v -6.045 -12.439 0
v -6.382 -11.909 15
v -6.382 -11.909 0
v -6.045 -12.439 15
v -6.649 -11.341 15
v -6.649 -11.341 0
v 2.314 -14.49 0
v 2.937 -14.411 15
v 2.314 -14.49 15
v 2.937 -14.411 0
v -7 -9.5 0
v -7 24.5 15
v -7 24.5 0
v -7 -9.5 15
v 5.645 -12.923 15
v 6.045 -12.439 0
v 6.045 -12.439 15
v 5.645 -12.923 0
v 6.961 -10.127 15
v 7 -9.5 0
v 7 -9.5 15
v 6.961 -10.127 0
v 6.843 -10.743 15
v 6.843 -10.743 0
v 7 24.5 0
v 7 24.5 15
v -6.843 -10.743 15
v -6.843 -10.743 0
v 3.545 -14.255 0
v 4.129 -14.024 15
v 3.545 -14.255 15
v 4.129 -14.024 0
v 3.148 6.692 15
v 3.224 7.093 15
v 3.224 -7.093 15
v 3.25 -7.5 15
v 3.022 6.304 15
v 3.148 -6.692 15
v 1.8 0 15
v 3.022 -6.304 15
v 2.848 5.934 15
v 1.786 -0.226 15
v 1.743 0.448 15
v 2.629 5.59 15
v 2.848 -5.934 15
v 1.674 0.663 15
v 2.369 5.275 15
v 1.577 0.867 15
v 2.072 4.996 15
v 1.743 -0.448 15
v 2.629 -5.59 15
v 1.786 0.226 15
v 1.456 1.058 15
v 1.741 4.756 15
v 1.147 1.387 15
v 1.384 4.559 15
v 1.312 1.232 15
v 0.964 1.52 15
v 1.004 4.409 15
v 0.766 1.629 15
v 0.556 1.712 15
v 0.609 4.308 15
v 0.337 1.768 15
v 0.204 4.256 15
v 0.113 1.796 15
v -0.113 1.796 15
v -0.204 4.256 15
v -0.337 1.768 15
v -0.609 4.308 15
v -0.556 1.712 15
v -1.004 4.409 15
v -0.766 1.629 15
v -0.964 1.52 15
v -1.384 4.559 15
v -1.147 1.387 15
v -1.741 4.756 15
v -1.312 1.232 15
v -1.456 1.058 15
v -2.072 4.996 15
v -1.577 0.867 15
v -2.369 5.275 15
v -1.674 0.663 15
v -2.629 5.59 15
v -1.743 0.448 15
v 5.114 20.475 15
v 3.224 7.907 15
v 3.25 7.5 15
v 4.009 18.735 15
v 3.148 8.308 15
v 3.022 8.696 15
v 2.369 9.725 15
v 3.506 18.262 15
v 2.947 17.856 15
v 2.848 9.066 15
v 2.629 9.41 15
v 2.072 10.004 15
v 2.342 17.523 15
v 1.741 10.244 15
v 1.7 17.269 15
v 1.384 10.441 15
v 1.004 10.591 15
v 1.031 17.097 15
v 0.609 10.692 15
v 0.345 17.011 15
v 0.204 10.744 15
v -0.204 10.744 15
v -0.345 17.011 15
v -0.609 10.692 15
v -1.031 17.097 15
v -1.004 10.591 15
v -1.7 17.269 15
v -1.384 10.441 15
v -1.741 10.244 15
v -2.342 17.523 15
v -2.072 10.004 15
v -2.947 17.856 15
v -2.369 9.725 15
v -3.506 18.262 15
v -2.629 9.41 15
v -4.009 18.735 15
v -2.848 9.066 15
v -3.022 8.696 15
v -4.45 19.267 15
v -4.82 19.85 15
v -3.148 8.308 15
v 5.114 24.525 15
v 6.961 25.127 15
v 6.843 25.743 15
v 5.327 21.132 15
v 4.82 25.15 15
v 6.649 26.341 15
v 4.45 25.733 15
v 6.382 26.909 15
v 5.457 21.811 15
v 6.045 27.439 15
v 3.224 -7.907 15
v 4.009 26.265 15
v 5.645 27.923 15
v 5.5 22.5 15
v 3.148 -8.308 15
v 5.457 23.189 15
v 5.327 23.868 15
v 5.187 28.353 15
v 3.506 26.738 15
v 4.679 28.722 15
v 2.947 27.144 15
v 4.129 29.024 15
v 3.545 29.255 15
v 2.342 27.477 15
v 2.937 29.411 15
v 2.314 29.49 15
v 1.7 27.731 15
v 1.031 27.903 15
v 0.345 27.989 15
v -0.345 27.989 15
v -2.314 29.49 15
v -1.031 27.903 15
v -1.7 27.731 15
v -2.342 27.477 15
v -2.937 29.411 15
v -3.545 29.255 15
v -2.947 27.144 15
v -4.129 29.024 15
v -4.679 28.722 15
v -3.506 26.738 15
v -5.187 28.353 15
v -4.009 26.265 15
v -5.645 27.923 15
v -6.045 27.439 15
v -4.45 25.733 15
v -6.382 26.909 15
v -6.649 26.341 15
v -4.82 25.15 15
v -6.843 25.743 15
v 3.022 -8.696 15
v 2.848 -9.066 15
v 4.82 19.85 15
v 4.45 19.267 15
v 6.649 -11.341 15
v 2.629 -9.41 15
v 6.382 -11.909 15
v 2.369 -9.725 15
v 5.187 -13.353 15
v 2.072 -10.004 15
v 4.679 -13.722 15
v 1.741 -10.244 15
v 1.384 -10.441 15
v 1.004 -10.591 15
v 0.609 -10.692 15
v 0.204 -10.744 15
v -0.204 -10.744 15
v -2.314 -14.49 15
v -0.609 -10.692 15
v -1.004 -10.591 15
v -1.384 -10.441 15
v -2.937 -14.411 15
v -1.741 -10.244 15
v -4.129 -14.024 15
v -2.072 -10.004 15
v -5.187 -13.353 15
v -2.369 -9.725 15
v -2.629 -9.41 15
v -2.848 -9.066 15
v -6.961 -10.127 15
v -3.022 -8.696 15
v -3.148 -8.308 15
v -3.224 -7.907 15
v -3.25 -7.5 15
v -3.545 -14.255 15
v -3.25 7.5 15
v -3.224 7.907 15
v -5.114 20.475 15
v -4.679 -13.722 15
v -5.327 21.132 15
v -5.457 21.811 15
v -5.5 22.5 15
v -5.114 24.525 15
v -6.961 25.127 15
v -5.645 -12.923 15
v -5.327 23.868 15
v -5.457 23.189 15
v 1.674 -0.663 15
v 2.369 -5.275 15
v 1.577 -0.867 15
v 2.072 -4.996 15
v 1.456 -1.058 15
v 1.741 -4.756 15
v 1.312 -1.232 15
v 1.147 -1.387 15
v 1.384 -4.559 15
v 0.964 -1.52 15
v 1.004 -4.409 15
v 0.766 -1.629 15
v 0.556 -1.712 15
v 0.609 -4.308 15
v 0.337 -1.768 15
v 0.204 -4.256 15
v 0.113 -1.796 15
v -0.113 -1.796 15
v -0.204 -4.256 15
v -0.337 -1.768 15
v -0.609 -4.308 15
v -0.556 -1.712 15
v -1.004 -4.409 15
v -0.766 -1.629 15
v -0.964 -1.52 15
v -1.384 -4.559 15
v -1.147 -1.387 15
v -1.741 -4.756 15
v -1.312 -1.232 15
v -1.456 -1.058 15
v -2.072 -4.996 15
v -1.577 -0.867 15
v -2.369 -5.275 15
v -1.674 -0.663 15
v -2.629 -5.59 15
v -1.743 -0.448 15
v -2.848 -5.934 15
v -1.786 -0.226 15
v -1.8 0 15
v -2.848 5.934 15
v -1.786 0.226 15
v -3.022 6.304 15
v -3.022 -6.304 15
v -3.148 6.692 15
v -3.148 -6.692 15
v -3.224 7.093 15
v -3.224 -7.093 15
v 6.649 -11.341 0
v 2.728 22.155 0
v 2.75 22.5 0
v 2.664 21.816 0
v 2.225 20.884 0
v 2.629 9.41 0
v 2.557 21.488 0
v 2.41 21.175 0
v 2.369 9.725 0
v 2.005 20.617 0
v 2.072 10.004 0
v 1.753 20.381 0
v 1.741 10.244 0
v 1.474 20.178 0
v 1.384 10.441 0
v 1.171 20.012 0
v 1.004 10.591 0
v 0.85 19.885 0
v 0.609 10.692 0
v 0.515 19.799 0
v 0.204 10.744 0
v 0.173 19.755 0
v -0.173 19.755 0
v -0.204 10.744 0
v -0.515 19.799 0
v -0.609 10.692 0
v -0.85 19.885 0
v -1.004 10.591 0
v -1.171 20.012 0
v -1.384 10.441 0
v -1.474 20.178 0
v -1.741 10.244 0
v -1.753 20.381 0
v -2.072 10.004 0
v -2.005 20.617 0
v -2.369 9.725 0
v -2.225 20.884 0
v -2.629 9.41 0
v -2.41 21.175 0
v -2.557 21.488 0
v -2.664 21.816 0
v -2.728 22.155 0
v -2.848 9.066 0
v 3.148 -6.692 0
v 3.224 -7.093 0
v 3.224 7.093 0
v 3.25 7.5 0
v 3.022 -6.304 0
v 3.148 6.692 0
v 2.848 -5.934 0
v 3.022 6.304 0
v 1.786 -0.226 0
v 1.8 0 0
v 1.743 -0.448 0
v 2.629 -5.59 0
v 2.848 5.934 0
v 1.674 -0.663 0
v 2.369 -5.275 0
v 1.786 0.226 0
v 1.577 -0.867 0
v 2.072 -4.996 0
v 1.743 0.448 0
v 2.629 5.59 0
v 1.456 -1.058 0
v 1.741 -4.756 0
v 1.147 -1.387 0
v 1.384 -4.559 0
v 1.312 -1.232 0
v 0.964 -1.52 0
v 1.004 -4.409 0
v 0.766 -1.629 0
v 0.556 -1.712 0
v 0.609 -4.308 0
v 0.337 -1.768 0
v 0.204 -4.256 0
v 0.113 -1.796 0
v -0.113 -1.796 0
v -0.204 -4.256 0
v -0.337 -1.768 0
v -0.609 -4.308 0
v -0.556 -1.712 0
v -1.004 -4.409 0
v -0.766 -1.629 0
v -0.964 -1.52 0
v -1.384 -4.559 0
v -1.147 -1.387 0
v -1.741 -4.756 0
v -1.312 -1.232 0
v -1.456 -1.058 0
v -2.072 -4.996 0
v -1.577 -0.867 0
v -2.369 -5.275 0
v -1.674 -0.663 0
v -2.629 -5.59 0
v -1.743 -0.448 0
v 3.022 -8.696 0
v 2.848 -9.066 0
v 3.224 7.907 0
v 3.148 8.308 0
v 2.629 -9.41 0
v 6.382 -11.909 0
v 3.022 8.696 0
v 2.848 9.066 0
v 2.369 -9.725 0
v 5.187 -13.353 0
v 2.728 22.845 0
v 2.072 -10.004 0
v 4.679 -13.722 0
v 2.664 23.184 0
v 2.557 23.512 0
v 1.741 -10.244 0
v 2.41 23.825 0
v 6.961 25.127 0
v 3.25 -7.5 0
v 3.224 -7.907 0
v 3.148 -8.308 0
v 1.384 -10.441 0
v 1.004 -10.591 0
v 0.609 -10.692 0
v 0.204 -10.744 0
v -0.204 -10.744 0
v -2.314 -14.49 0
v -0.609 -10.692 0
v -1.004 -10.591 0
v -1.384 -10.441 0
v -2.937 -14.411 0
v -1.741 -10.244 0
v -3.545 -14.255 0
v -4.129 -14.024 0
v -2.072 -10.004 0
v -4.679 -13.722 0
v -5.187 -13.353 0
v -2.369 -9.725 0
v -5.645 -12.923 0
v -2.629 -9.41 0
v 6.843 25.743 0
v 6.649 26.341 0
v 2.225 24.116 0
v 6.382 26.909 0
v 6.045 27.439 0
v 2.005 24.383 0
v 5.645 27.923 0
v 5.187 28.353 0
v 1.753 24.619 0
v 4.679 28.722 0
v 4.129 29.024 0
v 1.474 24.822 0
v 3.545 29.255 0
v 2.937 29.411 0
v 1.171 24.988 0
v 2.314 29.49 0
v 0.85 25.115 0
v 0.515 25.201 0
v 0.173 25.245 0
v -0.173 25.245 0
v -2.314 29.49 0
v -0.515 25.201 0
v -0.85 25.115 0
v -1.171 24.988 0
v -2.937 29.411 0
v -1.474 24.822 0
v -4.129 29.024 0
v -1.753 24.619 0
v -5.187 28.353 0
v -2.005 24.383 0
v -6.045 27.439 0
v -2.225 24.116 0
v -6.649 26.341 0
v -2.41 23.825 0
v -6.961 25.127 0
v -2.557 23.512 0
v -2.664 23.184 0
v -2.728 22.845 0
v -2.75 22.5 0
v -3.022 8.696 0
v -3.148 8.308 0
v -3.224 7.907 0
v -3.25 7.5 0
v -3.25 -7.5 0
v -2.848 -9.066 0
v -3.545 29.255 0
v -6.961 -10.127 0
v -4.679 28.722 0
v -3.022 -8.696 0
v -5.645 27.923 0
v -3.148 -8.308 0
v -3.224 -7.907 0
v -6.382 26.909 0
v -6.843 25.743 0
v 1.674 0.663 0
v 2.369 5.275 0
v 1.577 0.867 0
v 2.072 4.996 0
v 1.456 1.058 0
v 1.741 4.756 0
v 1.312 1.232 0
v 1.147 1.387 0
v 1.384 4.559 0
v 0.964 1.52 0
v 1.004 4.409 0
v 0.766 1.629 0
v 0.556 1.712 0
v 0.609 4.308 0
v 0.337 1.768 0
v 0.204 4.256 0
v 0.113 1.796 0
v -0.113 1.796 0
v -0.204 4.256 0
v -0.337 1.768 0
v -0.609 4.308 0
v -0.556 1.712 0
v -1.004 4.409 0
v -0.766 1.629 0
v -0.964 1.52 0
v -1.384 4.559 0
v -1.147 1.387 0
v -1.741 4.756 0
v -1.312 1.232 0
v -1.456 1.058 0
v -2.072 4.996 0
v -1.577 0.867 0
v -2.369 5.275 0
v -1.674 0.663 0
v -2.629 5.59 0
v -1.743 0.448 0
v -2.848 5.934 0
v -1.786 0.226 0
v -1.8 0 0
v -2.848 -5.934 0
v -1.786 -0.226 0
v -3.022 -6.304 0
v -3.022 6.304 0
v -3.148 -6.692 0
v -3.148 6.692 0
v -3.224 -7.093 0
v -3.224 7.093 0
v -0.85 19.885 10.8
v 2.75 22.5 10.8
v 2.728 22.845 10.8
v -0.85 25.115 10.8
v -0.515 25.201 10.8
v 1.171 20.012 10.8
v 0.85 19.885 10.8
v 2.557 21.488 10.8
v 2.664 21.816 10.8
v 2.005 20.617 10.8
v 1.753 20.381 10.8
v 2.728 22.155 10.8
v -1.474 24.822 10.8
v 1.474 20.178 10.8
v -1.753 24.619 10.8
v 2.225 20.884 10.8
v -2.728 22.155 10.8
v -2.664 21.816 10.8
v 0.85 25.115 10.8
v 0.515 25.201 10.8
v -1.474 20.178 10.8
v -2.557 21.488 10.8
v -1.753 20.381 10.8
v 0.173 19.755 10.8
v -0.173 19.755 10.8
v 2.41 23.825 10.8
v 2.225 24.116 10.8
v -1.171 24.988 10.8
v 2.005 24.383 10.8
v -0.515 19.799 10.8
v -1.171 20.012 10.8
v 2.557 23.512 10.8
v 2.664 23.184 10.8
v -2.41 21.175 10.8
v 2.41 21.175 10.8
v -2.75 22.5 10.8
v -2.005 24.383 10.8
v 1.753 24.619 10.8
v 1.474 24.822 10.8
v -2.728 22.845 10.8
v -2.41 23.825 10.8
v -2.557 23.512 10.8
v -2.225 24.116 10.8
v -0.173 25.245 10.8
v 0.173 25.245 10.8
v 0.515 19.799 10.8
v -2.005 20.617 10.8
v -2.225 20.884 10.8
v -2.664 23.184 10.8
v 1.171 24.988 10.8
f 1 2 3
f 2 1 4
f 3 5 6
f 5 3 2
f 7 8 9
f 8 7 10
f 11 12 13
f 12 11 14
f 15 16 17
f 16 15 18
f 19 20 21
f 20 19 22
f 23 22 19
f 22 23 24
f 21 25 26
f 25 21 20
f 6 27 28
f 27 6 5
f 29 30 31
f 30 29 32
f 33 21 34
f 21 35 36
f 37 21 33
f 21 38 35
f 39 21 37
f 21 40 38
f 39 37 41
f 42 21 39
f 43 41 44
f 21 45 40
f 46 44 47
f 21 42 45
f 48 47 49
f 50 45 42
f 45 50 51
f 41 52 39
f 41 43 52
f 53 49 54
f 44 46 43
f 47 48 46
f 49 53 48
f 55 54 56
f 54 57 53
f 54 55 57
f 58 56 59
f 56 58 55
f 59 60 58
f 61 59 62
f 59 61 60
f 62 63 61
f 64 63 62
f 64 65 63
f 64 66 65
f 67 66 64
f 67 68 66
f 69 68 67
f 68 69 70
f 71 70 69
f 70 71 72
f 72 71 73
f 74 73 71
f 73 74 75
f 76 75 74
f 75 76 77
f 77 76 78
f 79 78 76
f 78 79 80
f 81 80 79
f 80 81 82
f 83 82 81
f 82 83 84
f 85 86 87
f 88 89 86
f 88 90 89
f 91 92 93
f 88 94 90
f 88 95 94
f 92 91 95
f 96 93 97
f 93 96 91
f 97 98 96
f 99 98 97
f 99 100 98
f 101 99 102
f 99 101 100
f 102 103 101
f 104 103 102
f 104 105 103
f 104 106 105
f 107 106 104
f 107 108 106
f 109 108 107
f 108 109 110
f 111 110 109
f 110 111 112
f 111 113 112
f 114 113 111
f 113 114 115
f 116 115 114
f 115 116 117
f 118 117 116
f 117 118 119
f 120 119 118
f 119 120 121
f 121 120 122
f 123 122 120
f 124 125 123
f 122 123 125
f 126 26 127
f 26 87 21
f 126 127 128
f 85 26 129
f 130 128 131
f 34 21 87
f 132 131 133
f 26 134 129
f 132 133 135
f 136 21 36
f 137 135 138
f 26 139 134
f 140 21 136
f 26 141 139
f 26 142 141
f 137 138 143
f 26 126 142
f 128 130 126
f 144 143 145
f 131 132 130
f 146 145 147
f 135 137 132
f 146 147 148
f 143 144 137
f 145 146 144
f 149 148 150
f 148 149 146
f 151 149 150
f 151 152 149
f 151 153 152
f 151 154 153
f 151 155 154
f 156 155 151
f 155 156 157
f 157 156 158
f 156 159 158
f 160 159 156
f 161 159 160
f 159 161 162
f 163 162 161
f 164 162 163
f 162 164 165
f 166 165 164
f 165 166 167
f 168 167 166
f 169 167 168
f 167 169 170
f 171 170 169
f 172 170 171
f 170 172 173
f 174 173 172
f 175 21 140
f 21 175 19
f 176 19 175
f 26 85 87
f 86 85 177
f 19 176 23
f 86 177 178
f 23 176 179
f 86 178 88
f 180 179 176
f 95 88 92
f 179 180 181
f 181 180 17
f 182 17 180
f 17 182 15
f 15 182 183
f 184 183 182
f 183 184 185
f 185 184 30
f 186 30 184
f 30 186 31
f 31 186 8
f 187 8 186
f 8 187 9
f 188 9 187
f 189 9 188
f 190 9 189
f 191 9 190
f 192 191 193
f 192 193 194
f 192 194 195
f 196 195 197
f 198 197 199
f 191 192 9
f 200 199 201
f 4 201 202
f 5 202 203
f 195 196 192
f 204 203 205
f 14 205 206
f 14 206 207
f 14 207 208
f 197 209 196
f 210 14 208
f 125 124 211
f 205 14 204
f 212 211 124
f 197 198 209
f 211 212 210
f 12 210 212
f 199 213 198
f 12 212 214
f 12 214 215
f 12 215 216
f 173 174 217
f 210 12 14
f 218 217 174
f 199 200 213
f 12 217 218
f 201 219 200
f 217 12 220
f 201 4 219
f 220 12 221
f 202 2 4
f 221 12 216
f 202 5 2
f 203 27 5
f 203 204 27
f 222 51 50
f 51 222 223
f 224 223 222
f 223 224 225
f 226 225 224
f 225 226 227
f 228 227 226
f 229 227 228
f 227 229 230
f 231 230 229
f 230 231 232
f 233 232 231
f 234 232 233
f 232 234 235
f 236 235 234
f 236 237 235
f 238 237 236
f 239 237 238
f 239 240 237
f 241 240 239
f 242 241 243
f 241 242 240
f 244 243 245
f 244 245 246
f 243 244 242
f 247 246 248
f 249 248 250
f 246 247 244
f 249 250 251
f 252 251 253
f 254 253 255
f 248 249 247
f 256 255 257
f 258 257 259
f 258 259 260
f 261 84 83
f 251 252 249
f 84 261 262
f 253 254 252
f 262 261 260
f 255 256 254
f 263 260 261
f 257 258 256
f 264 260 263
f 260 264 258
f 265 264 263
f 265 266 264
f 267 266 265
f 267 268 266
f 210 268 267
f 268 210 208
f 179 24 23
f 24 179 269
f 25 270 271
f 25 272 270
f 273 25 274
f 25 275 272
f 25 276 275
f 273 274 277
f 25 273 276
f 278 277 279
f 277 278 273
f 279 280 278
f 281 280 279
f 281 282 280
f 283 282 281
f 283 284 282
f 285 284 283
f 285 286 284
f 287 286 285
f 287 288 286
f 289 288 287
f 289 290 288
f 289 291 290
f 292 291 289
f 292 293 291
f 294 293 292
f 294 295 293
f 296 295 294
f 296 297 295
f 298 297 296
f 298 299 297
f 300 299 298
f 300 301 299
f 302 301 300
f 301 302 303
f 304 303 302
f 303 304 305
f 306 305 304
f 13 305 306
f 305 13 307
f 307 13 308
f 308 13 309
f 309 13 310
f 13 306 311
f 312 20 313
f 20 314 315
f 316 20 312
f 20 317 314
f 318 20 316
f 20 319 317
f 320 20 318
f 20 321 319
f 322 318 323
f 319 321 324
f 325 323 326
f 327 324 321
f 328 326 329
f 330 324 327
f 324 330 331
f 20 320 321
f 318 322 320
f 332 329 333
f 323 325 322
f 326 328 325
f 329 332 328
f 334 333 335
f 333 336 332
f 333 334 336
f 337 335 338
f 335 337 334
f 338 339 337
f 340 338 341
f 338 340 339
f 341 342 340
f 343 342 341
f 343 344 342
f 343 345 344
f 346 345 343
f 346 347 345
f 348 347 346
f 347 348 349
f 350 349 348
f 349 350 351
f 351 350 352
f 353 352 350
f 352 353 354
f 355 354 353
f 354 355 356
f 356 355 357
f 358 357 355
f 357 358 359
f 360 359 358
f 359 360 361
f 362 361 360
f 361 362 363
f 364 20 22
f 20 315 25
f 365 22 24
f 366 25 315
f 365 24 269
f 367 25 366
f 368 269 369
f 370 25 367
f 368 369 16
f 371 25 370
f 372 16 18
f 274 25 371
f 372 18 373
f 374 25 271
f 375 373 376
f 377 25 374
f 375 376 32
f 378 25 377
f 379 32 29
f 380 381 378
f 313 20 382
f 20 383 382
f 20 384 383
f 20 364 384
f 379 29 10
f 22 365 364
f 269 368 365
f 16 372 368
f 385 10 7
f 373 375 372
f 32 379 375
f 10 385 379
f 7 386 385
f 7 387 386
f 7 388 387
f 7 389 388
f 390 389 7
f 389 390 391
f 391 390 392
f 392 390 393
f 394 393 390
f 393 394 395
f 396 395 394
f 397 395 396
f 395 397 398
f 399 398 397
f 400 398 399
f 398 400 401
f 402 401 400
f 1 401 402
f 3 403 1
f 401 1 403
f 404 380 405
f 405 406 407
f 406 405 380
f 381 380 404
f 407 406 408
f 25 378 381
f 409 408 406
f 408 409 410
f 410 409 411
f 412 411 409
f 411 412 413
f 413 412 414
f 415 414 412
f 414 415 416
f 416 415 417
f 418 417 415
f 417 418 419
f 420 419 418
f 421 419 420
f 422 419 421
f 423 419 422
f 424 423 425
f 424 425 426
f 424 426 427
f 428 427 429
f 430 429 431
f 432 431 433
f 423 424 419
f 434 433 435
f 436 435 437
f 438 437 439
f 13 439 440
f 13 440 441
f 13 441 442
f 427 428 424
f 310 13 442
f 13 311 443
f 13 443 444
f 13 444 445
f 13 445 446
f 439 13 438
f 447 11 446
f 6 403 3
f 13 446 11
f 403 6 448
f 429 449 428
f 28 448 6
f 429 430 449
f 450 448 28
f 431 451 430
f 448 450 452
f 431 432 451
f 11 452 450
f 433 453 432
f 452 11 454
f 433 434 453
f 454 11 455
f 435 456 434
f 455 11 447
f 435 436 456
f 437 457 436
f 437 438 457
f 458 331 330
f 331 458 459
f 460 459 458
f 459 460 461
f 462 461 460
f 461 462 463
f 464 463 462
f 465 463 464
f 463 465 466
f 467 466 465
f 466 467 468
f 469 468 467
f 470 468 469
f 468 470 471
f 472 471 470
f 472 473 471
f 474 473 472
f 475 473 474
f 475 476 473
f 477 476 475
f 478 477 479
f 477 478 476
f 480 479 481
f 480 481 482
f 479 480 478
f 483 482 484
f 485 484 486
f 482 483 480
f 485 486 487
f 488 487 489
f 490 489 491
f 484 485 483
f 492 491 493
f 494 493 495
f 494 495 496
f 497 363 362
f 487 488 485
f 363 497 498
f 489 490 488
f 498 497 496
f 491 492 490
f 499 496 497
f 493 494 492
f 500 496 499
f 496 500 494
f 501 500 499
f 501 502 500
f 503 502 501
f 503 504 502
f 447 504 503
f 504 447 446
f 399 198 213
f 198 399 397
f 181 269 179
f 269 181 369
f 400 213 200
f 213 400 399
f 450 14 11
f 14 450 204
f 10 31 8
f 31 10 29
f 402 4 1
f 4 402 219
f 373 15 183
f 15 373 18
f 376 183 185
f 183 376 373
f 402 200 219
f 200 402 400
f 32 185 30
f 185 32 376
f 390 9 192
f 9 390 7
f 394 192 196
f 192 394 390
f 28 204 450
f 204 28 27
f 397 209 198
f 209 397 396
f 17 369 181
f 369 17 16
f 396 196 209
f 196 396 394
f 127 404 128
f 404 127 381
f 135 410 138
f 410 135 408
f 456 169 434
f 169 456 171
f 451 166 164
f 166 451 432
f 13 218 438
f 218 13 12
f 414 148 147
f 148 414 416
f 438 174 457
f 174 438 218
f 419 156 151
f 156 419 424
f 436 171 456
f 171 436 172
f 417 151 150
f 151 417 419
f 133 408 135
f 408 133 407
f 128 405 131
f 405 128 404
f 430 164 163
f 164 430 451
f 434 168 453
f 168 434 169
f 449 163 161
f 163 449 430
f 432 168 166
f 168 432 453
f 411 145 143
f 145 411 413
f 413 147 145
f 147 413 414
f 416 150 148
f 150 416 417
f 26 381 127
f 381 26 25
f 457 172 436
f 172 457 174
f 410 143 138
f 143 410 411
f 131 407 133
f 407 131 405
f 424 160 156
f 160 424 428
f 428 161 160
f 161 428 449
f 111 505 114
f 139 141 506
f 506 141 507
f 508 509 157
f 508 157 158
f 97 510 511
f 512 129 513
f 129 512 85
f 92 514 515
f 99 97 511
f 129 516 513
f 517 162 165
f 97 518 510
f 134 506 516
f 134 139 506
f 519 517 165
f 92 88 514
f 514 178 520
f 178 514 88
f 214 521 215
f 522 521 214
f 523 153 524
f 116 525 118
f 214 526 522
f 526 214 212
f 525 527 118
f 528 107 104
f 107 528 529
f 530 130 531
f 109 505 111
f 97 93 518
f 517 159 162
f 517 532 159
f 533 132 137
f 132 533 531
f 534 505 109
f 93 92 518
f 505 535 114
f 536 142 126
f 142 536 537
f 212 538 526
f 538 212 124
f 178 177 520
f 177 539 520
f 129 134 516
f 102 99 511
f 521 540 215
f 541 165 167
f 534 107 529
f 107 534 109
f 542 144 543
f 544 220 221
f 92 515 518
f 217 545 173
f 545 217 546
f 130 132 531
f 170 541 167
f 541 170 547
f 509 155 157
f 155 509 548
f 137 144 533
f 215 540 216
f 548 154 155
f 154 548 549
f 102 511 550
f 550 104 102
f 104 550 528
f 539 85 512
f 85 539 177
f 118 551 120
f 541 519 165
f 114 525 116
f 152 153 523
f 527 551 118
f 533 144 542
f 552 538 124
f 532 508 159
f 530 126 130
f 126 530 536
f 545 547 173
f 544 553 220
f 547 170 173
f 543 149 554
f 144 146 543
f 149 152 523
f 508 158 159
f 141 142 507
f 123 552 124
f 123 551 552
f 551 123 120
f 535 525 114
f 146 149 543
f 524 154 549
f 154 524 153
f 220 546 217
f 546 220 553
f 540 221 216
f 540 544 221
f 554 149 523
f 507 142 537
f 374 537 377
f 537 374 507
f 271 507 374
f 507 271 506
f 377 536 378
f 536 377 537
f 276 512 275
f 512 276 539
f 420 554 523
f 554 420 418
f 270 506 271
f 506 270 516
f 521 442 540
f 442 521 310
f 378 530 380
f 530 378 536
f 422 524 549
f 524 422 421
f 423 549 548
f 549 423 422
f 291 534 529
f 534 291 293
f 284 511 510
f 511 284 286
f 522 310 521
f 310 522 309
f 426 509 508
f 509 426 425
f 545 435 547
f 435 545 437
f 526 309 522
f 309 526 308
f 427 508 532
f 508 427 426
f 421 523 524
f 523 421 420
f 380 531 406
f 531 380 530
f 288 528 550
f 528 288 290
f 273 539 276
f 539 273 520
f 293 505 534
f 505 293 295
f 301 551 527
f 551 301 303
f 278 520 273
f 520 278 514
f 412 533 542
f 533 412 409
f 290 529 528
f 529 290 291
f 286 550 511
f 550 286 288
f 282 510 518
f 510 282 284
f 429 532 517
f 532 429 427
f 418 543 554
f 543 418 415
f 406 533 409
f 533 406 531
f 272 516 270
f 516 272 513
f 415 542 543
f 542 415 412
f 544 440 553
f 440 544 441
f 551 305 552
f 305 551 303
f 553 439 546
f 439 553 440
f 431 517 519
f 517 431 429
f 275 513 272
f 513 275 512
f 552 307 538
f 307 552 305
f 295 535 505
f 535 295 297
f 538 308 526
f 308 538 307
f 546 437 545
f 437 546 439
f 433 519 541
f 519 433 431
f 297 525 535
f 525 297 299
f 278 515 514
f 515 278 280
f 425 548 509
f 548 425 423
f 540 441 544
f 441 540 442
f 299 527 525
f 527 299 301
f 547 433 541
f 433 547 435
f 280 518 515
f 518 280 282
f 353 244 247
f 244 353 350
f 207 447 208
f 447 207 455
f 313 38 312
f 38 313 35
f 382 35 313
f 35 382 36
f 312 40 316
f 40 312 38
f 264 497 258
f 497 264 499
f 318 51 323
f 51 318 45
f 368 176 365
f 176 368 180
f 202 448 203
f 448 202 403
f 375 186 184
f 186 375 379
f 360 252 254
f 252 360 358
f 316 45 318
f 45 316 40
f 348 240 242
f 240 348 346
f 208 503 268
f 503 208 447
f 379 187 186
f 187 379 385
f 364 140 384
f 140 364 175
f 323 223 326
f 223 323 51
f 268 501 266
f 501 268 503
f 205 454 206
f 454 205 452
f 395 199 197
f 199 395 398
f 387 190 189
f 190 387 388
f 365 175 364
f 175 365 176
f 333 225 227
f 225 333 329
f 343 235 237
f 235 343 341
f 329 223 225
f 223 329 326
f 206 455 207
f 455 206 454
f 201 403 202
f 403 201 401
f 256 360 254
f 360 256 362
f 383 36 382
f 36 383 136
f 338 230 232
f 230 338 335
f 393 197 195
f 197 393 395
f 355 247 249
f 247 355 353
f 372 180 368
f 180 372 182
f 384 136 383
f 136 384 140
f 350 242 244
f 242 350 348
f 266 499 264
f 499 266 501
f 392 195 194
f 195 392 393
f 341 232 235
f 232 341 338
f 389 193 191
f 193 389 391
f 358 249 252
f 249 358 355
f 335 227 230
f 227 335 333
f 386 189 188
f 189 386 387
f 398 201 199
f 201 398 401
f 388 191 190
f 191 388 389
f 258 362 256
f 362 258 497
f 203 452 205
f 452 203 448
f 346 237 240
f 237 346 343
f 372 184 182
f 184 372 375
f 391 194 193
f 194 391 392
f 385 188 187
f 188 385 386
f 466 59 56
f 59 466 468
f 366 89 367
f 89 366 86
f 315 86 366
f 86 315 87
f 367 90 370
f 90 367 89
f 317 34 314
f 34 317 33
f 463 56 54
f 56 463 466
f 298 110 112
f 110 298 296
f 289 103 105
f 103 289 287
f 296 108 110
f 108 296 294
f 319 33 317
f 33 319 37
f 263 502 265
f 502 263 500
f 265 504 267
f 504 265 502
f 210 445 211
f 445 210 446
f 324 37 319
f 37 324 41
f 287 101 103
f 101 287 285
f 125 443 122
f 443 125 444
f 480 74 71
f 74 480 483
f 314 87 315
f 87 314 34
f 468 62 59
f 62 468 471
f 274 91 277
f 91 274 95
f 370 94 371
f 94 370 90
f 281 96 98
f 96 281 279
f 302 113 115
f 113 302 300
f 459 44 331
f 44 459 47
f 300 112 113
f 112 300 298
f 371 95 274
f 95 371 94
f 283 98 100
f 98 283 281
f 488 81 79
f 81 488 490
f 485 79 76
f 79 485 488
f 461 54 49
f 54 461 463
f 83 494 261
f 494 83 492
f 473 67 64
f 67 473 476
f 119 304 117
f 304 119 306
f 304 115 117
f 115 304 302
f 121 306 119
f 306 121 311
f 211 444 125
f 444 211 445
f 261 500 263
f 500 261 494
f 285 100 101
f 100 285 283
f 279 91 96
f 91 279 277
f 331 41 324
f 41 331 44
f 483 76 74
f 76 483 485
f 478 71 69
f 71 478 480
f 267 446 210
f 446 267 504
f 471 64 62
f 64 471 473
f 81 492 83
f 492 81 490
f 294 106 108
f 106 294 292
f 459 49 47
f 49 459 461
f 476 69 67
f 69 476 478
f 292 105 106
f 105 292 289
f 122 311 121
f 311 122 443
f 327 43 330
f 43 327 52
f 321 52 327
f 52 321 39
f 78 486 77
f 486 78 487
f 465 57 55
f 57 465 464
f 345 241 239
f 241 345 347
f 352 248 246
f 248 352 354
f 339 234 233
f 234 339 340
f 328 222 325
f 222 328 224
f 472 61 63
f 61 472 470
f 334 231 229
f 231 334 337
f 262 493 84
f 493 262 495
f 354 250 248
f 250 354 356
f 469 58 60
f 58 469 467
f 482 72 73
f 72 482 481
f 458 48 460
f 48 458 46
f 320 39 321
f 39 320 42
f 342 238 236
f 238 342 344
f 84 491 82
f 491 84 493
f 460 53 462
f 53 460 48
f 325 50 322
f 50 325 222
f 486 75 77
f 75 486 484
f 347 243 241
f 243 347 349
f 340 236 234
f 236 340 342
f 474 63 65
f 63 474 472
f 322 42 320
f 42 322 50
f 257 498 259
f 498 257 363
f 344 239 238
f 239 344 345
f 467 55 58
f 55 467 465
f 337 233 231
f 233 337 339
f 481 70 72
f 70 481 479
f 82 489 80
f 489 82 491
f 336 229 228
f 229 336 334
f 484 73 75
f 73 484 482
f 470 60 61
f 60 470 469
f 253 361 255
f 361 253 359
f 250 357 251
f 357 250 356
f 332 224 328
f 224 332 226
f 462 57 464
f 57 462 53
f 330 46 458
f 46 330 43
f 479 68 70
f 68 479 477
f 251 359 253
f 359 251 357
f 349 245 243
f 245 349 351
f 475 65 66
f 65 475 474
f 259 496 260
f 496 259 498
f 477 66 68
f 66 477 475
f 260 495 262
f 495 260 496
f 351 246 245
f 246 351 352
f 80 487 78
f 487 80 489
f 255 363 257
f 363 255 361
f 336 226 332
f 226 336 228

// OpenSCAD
$fn = 50;


difference() {
	union() {
		hull() {
			translate(v = [-2.0000000000, 9.5000000000, 0]) {
				cylinder(h = 15, r = 5);
			}
			translate(v = [2.0000000000, 9.5000000000, 0]) {
				cylinder(h = 15, r = 5);
			}
			translate(v = [-2.0000000000, -9.5000000000, 0]) {
				cylinder(h = 15, r = 5);
			}
			translate(v = [2.0000000000, -9.5000000000, 0]) {
				cylinder(h = 15, r = 5);
			}
		}
		translate(v = [0.0000000000, 15.0000000000, 0]) {
			hull() {
				translate(v = [-2.0000000000, 9.5000000000, 0]) {
					cylinder(h = 15, r = 5);
				}
				translate(v = [2.0000000000, 9.5000000000, 0]) {
					cylinder(h = 15, r = 5);
				}
				translate(v = [-2.0000000000, -9.5000000000, 0]) {
					cylinder(h = 15, r = 5);
				}
				translate(v = [2.0000000000, -9.5000000000, 0]) {
					cylinder(h = 15, r = 5);
				}
			}
		}
		translate(v = [0.0000000000, 15.0000000000, 0]) {
			hull() {
				translate(v = [-2.0000000000, 9.5000000000, 0]) {
					cylinder(h = 15, r = 5);
				}
				translate(v = [2.0000000000, 9.5000000000, 0]) {
					cylinder(h = 15, r = 5);
				}
				translate(v = [-2.0000000000, -9.5000000000, 0]) {
					cylinder(h = 15, r = 5);
				}
				translate(v = [2.0000000000, -9.5000000000, 0]) {
					cylinder(h = 15, r = 5);
				}
			}
		}
	}
	union() {
		translate(v = [0.0000000000, 22.5000000000, 15]) {
			rotate(a = [0, 0, 0]) {
				difference() {
					union() {
						#translate(v = [0, 0, -15.0000000000]) {
							cylinder(h = 15, r = 2.2500000000);
						}
						#translate(v = [0, 0, -4.2000000000]) {
							cylinder(h = 4.2000000000, r1 = 2.7500000000, r2 = 5.5000000000);
						}
						#translate(v = [0, 0, -15.0000000000]) {
							cylinder(h = 15, r = 2.7500000000);
						}
						#translate(v = [0, 0, -15.0000000000]) {
							cylinder(h = 15, r = 2.2500000000);
						}
					}
					union();
				}
			}
		}
		translate(v = [0.0000000000, 22.5000000000, 15]) {
			rotate(a = [0, 0, 0]) {
				difference() {
					union() {
						#translate(v = [0, 0, -15.0000000000]) {
							cylinder(h = 15, r = 2.2500000000);
						}
						#translate(v = [0, 0, -4.2000000000]) {
							cylinder(h = 4.2000000000, r1 = 2.7500000000, r2 = 5.5000000000);
						}
						#translate(v = [0, 0, -15.0000000000]) {
							cylinder(h = 15, r = 2.7500000000);
						}
						#translate(v = [0, 0, -15.0000000000]) {
							cylinder(h = 15, r = 2.2500000000);
						}
					}
					union();
				}
			}
		}
		translate(v = [0.0000000000, -7.5000000000, 0]) {
			translate(v = [0, 0, -100]) {
				cylinder(h = 200, r = 3.2500000000);
			}
		}
		translate(v = [0.0000000000, 7.5000000000, 0]) {
			translate(v = [0, 0, -100]) {
				cylinder(h = 200, r = 3.2500000000);
			}
		}
		translate(v = [0.0000000000, -7.5000000000, 0]) {
			translate(v = [0, 0, -100]) {
				cylinder(h = 200, r = 1.8000000000);
			}
		}
		translate(v = [0, 0, -100]) {
			cylinder(h = 200, r = 1.8000000000);
		}
		translate(v = [0.0000000000, 7.5000000000, 0]) {
			translate(v = [0, 0, -100]) {
				cylinder(h = 200, r = 1.8000000000);
			}
		}
	}
}
